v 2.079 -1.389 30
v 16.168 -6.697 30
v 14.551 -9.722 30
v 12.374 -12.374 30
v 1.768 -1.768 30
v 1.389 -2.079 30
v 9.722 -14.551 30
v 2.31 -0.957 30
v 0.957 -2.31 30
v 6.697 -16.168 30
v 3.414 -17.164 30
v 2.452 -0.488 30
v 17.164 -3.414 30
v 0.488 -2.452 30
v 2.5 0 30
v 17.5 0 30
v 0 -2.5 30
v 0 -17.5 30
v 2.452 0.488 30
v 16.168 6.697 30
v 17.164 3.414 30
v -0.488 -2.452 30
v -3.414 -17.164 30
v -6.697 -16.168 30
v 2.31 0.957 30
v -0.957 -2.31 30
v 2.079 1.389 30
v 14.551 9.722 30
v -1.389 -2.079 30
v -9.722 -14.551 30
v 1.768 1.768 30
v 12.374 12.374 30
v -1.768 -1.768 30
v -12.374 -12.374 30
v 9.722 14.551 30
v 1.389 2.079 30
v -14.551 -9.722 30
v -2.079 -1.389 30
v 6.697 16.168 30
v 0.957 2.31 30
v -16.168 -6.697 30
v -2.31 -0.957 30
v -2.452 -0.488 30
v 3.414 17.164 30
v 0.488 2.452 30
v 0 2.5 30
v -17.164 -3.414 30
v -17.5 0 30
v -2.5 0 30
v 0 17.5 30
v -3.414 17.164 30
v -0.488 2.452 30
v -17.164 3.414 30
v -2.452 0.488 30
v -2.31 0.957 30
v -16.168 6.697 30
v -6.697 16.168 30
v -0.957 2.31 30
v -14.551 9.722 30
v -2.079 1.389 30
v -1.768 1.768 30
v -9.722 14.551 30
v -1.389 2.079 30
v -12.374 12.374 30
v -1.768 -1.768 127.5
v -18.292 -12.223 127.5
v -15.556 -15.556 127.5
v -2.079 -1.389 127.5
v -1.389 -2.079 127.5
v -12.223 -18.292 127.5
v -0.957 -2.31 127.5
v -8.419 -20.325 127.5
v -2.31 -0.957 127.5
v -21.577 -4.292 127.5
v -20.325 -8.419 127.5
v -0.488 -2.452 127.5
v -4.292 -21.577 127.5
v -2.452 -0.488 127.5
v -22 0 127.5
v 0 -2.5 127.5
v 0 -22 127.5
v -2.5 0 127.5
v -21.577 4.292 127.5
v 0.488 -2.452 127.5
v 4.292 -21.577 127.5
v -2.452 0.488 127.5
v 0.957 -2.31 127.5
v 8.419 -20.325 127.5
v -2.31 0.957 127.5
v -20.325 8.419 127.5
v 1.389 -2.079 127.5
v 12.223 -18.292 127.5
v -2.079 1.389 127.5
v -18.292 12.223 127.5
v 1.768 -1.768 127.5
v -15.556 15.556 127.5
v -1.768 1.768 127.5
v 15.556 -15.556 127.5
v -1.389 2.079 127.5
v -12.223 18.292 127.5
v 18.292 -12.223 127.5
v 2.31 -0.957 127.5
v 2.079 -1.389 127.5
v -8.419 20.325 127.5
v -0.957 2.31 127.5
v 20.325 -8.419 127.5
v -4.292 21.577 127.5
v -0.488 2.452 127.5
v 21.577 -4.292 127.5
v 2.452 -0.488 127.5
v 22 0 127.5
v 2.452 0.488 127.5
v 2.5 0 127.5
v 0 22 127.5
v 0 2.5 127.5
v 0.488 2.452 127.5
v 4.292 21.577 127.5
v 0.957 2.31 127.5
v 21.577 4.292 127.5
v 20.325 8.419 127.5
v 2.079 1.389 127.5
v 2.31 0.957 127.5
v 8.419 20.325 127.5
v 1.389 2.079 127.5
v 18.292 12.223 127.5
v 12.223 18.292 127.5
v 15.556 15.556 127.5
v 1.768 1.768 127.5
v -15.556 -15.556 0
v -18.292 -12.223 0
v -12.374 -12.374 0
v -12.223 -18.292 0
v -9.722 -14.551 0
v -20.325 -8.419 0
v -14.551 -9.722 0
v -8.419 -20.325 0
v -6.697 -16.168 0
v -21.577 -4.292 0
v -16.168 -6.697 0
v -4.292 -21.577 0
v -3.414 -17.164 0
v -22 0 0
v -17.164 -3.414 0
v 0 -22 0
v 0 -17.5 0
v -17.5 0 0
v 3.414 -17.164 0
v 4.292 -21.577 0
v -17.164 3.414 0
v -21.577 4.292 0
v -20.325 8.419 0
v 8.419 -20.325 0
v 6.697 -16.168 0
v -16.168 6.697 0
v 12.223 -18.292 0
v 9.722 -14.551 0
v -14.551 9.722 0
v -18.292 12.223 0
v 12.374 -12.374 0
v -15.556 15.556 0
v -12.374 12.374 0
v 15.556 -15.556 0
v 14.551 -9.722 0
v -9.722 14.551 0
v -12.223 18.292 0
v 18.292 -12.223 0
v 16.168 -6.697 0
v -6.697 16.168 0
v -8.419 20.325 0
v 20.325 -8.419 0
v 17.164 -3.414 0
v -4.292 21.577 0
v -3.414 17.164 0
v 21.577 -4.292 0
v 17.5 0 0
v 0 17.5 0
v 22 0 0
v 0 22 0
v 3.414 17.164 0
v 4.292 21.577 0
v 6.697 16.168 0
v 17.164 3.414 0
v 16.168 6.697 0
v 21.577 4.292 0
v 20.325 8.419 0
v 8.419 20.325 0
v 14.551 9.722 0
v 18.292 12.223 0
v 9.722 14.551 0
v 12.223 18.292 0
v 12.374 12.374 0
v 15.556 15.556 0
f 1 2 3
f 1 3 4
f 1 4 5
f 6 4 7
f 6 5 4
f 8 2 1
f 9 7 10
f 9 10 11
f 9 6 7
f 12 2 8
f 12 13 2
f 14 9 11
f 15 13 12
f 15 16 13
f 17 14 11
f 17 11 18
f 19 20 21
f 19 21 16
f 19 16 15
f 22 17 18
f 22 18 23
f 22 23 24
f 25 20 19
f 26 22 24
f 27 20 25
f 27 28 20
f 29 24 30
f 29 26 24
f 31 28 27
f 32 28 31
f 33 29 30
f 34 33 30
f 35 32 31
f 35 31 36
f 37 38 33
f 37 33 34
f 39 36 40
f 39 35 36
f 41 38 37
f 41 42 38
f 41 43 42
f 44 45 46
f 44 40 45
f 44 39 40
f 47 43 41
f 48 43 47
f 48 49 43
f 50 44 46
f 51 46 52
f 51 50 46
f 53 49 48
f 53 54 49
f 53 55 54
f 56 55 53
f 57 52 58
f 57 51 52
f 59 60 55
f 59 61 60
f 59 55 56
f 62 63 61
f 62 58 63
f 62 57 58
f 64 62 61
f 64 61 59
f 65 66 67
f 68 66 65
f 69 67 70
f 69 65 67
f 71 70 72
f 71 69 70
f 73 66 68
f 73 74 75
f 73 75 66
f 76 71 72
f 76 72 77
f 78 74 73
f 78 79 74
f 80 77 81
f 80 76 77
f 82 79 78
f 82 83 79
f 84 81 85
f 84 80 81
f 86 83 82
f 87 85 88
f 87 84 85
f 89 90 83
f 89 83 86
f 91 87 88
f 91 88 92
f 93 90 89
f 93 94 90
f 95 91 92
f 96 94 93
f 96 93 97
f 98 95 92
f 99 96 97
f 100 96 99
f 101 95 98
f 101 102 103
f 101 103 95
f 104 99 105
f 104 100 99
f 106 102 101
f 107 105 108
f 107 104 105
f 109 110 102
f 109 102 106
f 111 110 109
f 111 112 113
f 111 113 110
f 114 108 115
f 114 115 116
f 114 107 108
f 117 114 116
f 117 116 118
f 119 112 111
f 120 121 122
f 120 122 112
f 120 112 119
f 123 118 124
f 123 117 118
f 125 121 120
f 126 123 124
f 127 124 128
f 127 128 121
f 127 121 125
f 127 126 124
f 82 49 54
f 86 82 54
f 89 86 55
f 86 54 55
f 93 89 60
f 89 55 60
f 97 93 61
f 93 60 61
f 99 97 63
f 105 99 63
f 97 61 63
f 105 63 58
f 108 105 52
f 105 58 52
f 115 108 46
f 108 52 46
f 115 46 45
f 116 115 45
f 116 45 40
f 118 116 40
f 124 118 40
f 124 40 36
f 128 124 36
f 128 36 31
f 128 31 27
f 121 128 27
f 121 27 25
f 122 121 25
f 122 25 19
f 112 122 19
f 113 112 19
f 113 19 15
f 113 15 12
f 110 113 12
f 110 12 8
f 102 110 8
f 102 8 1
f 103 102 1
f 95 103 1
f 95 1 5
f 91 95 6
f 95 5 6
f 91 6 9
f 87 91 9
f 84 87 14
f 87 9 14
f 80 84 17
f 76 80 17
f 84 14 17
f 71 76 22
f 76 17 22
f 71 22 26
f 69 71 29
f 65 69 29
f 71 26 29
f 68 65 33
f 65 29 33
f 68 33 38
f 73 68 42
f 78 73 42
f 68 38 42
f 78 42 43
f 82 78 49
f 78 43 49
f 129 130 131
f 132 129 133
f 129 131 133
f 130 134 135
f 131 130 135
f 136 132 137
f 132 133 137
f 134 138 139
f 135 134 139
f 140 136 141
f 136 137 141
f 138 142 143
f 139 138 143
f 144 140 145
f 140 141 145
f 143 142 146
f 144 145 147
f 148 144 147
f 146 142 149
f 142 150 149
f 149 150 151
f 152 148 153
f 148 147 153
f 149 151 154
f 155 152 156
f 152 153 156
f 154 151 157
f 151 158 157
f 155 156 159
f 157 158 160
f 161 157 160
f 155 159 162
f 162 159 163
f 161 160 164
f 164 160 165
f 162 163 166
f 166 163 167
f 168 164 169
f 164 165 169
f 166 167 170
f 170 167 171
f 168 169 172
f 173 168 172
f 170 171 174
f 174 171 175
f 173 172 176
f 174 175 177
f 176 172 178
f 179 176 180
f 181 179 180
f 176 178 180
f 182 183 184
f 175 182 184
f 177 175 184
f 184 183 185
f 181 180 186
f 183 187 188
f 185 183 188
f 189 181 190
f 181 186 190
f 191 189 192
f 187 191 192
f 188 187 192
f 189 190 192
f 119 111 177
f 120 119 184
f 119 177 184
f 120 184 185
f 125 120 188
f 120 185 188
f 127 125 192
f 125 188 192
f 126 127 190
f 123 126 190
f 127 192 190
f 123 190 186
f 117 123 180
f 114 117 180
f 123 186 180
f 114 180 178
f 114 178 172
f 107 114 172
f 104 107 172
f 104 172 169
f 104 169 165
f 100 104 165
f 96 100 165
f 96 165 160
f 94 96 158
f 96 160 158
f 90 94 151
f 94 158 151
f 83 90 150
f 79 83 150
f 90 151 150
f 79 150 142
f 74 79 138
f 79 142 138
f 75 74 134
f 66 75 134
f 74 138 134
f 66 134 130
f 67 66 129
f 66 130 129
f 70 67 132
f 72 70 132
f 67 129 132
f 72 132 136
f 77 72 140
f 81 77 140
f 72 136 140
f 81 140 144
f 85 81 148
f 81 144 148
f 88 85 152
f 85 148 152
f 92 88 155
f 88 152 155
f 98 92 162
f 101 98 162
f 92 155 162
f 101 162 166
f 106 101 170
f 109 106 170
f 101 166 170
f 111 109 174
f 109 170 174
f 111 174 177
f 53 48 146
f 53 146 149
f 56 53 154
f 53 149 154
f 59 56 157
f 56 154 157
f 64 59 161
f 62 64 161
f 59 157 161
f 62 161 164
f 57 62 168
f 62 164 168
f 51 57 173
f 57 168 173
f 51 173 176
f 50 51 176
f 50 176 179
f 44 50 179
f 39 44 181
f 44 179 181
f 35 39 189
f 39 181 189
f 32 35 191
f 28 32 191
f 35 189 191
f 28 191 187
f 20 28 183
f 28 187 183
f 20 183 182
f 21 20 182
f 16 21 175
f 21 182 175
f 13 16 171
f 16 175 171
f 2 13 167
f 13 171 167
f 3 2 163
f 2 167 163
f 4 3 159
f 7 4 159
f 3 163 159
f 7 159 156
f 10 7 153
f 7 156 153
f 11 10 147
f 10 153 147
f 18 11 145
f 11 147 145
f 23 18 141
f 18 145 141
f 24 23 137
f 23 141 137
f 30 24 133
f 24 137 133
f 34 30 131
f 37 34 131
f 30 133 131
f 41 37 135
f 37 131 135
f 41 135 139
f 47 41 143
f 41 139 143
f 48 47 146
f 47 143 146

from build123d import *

# Parameters (mm, degrees)
SKETCH2_R           = 22
BOSS_EXTRUDE1_DEPTH = 127.5
SKETCH3_R           = 2.5
CUT_EXTRUDE1_DEPTH  = 135
SKETCH5_R           = 17.5
CUT_EXTRUDE2_DEPTH  = 30


with BuildPart() as part:
    # Sketch2 → Boss-Extrude1 (new body)
    with BuildSketch(Plane.XY):
        Circle(SKETCH2_R)
    extrude(amount=BOSS_EXTRUDE1_DEPTH)

    # Sketch3 → Cut-Extrude1 (cut)
    with BuildSketch(Plane(origin=(0, 0, 0), x_dir=(-1, 0, 0), z_dir=(0, 0, -1))):
        Circle(SKETCH3_R)
    extrude(amount=-CUT_EXTRUDE1_DEPTH, mode=Mode.SUBTRACT)

    # Sketch5 → Cut-Extrude2 (cut)
    with BuildSketch(Plane(origin=(0, 0, 0), x_dir=(-1, 0, 0), z_dir=(0, 0, -1))):
        Circle(SKETCH5_R)
    extrude(amount=-CUT_EXTRUDE2_DEPTH, mode=Mode.SUBTRACT)


solid = part.part
